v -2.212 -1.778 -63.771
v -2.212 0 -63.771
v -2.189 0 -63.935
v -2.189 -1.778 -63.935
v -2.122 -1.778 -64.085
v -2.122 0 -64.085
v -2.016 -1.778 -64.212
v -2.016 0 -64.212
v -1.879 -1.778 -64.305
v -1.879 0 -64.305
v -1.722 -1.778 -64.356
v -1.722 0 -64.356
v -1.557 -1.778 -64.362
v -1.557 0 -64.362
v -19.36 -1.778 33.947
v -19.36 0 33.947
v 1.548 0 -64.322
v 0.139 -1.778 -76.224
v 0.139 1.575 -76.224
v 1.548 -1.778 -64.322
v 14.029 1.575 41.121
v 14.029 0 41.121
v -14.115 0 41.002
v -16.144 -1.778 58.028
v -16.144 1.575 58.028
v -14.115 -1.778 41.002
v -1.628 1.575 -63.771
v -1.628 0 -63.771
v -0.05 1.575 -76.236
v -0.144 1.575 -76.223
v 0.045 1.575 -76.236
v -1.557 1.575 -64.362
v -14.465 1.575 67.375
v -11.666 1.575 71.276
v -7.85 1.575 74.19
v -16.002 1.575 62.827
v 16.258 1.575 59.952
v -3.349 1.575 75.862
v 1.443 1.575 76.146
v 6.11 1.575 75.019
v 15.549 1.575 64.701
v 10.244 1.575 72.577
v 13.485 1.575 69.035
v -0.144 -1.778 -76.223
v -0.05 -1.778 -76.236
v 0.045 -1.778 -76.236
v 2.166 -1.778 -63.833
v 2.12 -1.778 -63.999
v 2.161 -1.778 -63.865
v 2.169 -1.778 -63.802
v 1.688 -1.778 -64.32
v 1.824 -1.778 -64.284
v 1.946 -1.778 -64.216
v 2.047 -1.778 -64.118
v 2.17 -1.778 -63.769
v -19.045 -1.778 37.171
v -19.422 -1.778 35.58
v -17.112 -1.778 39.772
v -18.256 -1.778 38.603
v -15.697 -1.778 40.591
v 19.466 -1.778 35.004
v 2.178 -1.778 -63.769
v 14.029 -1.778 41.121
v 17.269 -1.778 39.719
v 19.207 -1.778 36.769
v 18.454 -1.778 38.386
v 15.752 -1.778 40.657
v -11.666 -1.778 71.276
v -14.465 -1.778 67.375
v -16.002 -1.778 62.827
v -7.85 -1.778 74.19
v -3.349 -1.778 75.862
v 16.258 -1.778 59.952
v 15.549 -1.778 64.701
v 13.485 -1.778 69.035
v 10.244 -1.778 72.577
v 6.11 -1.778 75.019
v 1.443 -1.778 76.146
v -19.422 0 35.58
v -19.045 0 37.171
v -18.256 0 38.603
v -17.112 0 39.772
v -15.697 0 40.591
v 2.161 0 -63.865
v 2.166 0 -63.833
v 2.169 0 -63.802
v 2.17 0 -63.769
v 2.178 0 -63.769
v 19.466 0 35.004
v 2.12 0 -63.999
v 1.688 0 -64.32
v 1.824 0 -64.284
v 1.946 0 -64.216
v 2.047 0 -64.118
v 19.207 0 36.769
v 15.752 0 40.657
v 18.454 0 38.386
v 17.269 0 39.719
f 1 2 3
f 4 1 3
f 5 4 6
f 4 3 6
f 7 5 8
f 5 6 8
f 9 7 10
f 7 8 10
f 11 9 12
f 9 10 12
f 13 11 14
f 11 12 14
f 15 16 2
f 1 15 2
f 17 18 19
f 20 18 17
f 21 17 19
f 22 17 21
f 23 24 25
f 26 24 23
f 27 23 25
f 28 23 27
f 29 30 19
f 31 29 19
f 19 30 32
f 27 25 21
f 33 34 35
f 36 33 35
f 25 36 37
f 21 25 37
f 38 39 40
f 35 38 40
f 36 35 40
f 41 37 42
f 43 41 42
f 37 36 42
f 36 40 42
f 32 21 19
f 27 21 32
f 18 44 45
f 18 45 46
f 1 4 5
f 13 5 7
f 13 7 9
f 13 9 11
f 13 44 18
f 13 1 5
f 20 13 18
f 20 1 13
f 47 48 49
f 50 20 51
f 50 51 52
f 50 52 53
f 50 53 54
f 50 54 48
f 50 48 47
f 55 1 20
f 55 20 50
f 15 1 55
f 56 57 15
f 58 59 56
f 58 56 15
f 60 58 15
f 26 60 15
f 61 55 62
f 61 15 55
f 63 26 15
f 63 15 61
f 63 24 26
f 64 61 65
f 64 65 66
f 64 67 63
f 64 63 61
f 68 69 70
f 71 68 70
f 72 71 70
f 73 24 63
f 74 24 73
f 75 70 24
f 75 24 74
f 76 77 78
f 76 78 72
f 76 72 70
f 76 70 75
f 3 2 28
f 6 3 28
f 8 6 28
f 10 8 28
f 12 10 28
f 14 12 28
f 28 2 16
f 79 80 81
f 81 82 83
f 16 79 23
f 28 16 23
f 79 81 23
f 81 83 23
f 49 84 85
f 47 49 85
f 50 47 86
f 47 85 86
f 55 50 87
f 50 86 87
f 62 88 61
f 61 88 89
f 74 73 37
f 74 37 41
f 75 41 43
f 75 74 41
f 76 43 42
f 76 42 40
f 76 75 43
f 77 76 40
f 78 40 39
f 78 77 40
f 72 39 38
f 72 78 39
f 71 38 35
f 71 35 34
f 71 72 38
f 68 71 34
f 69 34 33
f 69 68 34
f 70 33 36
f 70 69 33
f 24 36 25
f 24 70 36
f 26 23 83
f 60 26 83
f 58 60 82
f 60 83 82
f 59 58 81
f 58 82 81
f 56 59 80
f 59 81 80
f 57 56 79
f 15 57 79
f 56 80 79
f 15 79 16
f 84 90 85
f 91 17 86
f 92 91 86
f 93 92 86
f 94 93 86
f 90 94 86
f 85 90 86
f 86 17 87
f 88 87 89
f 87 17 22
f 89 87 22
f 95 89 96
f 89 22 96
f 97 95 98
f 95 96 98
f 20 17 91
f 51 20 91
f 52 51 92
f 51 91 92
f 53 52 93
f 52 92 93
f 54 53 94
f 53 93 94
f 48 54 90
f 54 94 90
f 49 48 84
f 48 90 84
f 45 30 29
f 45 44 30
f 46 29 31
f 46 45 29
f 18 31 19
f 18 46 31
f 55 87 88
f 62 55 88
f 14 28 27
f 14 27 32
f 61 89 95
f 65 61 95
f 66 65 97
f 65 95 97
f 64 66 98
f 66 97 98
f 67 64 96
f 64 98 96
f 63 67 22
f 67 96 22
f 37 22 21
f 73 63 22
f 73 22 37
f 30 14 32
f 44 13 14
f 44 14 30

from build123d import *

# Parameters (mm, degrees)
F1_DEPTH = 1.778
F2_DEPTH = 1.5748
F3_DEPTH = 1.778


with BuildPart() as f1:
    # F0 (on Front) → F1 (new body)
    with BuildSketch(Plane.XZ):
        with BuildLine():
            Line((14.02935353, 41.1213250894), (16.2583384663, 59.9522180855))
            ThreePointArc((16.2583384663, 59.9522180855), (-0.9637356423, 76.1819680311), (-16.1440849231, 58.0281360497))
            Line((-16.1440849231, 58.0281360497), (-14.1149313353, 41.0024441959))
            Line((-14.1149313353, 41.0024441959), (-1.6278814086, -63.7706323678))
            Line((-1.6278814086, -63.7706323678), (-1.5574045531, -64.3619711562))
            Line((-1.5574045531, -64.3619711562), (-0.1437664474, -76.223156493))
            ThreePointArc((-0.1437664474, -76.223156493), (-0.0022464, -76.237388177), (0.1393582085, -76.2240240658))
            Line((0.1393582085, -76.2240240658), (1.5482228022, -64.3216652936))
            Line((1.5482228022, -64.3216652936), (14.02935353, 41.1213250894))
        make_face()
    extrude(amount=F1_DEPTH)

    # F2 (add): a face of the model
    f2_faces = [f1.faces().sort_by_distance(p)[0] for p in [
        (-0.03237785, 0, 22.4036287073),
    ]]
    extrude(f2_faces, amount=F2_DEPTH)

    # F0 (on Front) → F3 (join)
    with BuildSketch(Plane.XZ):
        with BuildLine():
            ThreePointArc((19.465577211, 35.0036723741), (17.9101589408, 39.0956829635), (14.02935353, 41.1213250894))
            Line((14.02935353, 41.1213250894), (1.5482228022, -64.3216652936))
            ThreePointArc((1.5482228022, -64.3216652936), (1.9456415345, -64.2155103566), (2.1613873882, -63.865275798))
            ThreePointArc((2.1613873882, -63.865275798), (2.1676286256, -63.8175184176), (2.1697142526, -63.7694001198))
            Line((2.1697142526, -63.7694001198), (2.1781676915, -63.7694001198))
            Line((2.1781676915, -63.7694001198), (19.465577211, 35.0036723741))
        make_face()
        with BuildLine():
            Line((-1.6278814086, -63.7706323678), (-14.1149313353, 41.0024441959))
            ThreePointArc((-14.1149313353, 41.0024441959), (-18.2559821933, 38.6033472019), (-19.3598979472, 33.9465952648))
            Line((-19.3598979472, 33.9465952648), (-2.2124765092, -63.7709956311))
            ThreePointArc((-2.2124765092, -63.7709956311), (-2.0162187298, -64.2119998537), (-1.5574045531, -64.3619711562))
            Line((-1.5574045531, -64.3619711562), (-1.6278814086, -63.7706323678))
        make_face()
    extrude(amount=F3_DEPTH)


solid = f1.part
